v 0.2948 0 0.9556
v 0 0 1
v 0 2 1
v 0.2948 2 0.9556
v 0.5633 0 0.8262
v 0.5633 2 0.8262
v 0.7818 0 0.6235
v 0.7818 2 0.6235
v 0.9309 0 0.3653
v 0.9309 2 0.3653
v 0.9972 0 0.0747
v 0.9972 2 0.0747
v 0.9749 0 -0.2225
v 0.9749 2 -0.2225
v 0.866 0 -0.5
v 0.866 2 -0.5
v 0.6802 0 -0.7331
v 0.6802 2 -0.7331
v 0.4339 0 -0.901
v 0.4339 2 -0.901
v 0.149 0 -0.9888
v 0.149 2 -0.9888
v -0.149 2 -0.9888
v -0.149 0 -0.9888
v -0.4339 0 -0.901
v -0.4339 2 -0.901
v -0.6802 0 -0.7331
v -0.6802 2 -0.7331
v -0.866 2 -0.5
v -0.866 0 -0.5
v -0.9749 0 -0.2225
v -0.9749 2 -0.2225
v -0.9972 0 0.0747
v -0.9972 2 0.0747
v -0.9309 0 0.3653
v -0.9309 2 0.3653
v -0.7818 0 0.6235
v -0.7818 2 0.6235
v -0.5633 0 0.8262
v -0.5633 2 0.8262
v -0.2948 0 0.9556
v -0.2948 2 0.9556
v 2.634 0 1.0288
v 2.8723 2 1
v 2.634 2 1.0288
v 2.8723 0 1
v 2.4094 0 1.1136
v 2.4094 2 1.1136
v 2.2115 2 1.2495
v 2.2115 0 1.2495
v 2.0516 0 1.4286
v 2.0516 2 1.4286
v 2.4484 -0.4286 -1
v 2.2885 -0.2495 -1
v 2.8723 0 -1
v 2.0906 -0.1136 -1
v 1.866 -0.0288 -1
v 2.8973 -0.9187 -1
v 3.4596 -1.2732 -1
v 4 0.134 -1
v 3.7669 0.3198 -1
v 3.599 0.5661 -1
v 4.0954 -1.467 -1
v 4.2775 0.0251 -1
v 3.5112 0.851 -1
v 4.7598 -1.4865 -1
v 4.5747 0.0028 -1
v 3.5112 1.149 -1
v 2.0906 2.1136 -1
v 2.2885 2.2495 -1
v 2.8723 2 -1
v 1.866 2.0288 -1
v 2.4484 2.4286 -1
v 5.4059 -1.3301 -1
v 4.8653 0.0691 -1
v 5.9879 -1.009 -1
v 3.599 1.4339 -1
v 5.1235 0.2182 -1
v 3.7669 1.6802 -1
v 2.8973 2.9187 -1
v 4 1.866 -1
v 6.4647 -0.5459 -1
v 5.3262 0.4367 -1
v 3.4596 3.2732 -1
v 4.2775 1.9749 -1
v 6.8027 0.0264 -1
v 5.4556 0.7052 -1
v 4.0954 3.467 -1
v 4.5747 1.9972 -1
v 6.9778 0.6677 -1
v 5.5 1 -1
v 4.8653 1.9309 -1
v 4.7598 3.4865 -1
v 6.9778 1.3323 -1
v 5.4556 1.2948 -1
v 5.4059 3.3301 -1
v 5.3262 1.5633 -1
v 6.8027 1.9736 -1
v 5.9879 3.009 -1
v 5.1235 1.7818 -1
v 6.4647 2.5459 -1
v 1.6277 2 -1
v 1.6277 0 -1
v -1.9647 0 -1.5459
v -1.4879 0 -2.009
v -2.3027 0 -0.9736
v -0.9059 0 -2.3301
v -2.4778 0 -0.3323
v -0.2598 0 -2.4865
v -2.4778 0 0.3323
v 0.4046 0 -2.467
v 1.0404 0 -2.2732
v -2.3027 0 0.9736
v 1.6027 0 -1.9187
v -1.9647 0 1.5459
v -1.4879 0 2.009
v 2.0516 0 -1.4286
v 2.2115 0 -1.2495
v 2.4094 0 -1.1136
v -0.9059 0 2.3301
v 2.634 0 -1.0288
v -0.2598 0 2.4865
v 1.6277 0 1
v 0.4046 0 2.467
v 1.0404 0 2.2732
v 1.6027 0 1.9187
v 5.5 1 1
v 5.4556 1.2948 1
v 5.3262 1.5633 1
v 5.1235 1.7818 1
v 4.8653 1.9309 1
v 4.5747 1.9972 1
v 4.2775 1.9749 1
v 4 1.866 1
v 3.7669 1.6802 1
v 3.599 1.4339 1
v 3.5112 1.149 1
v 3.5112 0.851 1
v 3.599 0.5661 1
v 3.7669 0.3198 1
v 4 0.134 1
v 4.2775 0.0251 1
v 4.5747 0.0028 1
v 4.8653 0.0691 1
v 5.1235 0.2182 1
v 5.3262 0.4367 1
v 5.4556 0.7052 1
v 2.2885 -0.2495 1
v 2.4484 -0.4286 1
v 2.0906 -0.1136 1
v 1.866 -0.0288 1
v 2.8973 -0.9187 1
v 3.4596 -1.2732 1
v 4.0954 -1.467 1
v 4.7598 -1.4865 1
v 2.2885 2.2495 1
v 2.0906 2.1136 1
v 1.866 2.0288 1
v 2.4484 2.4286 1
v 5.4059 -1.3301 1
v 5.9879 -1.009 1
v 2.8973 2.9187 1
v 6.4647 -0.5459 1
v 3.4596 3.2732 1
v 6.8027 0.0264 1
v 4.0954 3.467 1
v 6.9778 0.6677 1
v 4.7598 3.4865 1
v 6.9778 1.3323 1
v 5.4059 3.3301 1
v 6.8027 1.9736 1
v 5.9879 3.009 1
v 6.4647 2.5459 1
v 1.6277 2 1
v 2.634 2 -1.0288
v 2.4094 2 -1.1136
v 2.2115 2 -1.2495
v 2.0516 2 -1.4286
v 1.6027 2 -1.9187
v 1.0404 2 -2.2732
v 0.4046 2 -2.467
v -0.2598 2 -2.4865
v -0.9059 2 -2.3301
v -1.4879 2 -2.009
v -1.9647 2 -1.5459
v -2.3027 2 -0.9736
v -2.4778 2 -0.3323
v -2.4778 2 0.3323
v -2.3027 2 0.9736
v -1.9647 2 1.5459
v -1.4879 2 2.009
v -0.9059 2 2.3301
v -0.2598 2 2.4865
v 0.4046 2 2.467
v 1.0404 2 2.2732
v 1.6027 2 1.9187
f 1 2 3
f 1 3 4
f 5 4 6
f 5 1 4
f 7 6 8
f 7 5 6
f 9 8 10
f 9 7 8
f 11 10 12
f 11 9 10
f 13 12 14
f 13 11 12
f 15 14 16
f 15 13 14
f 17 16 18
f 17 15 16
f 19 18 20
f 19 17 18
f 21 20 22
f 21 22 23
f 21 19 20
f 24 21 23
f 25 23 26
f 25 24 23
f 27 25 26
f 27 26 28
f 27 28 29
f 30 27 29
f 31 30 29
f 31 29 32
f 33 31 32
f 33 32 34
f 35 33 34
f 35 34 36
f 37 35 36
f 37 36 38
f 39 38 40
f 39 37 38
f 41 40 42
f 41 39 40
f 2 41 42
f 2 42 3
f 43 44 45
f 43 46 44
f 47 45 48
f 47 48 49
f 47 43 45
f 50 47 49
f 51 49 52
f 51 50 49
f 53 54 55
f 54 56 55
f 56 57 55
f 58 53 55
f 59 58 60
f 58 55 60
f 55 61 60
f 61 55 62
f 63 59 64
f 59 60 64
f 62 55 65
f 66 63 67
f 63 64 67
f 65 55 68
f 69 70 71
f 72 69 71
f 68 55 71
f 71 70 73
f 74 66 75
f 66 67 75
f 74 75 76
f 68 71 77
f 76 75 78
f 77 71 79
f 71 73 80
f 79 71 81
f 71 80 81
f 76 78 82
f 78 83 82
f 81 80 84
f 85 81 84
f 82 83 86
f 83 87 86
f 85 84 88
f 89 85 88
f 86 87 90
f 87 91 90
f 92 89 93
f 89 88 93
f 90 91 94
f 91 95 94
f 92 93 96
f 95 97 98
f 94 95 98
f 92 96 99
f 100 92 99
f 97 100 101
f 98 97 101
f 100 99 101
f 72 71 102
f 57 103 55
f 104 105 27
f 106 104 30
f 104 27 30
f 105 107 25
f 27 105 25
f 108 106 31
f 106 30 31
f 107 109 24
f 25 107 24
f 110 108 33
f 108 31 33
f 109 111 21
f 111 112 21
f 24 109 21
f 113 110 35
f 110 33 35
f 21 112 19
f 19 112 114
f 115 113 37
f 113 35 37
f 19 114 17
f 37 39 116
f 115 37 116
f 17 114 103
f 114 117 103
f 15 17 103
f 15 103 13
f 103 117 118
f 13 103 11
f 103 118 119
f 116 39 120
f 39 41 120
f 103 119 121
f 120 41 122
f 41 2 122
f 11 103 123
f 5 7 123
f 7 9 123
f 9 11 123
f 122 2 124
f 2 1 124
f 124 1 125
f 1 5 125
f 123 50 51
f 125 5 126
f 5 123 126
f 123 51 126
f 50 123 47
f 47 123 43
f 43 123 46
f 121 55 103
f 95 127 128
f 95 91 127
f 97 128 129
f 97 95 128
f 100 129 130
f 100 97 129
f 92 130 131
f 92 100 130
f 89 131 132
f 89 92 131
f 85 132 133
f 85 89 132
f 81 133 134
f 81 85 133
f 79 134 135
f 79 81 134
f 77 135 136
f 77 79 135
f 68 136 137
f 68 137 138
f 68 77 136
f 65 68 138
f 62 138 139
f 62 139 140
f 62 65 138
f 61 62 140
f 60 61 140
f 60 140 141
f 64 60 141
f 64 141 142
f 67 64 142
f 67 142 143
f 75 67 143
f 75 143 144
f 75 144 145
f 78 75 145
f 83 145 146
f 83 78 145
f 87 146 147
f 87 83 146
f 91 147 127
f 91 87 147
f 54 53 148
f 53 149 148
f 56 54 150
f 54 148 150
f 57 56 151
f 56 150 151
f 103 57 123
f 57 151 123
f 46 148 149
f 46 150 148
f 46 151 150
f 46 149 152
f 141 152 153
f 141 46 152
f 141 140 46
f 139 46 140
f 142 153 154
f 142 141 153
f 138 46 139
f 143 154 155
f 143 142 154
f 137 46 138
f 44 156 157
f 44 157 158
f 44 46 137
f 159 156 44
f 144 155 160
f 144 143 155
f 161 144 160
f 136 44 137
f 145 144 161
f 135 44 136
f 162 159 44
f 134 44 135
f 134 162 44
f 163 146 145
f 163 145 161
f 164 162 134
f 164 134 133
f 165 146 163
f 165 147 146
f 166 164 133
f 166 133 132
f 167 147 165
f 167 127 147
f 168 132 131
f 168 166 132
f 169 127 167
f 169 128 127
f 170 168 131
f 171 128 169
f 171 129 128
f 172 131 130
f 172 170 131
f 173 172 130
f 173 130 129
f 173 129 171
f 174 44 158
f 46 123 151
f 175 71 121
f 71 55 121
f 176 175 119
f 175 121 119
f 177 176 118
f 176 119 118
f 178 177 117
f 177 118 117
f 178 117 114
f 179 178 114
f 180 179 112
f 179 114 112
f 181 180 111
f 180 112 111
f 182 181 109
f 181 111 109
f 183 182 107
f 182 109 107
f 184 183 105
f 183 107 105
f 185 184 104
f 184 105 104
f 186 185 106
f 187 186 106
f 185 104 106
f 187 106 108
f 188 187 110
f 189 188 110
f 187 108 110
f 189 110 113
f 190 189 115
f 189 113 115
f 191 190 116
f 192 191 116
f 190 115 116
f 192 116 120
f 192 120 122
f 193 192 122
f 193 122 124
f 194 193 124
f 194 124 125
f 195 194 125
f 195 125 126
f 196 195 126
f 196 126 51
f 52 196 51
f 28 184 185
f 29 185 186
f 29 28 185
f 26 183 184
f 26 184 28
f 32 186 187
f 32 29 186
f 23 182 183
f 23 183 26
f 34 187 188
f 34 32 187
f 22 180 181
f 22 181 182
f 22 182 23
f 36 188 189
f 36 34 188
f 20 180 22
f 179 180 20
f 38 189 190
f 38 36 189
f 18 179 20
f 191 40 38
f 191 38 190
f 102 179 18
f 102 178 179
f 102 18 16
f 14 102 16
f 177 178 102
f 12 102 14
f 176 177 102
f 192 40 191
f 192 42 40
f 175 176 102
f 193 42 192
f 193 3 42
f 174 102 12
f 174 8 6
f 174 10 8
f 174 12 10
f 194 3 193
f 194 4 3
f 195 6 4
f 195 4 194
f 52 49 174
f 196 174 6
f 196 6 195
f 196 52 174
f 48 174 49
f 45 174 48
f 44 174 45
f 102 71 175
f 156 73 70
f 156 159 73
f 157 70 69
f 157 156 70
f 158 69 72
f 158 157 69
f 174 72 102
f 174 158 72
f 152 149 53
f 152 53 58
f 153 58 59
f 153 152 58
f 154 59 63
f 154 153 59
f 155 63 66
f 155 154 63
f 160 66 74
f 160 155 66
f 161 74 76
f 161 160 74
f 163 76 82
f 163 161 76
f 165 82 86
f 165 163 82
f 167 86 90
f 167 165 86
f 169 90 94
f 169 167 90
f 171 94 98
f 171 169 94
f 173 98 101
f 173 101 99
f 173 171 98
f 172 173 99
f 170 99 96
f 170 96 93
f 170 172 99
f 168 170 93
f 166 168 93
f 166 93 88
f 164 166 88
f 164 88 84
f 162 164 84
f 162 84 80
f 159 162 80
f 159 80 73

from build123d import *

# Parameters (mm, degrees)
SKETCH1_R           = 2.5
SKETCH1_R_2         = 1
BOSS_EXTRUDE2_DEPTH = 2
SKETCH2_R           = 2.5
SKETCH2_R_2         = 1
BOSS_EXTRUDE3_DEPTH = 1
FILLET3_R           = 1
FILLET4_R           = 1
FILLET5_R           = 1
FILLET8_R           = 1


with BuildPart() as part:
    # Sketch1 → Boss-Extrude2 (new body)
    with BuildSketch(Plane(origin=(0, 0, 0), x_dir=(1, 0, 0), z_dir=(0, 1, 0))):
        with Locations(Location((0, 0, 0), (0, 0, 270))):
            Circle(SKETCH1_R)
        with Locations(Location((0, 0, 0), (0, 0, 270))):
            Circle(SKETCH1_R_2, mode=Mode.SUBTRACT)
    extrude(amount=BOSS_EXTRUDE2_DEPTH)

    # Sketch2 → Boss-Extrude3 (add, symmetric)
    with BuildSketch(Plane.XY):
        with Locations((4.5, 1)):
            Circle(SKETCH2_R)
        with Locations((4.5, 1)):
            Circle(SKETCH2_R_2, mode=Mode.SUBTRACT)
    extrude(amount=BOSS_EXTRUDE3_DEPTH, both=True)

    # Fillet3
    fillet3_edges = [part.edges().sort_by_distance(p)[0] for p in [
        (2.208712153, 2, 0),
    ]]
    fillet(fillet3_edges, radius=FILLET3_R)

    # Fillet4
    fillet4_edges = [part.edges().sort_by_distance(p)[0] for p in [
        (2.208712153, 0, 0),
    ]]
    fillet(fillet4_edges, radius=FILLET4_R)

    # Fillet5
    fillet5_edges = [part.edges().sort_by_distance(p)[0] for p in [
        (2.291287847, 1, -1),
    ]]
    fillet(fillet5_edges, radius=FILLET5_R)

    # Fillet8
    fillet8_edges = [part.edges().sort_by_distance(p)[0] for p in [
        (2.291287847, 1, 1),
    ]]
    fillet(fillet8_edges, radius=FILLET8_R)


solid = part.part
